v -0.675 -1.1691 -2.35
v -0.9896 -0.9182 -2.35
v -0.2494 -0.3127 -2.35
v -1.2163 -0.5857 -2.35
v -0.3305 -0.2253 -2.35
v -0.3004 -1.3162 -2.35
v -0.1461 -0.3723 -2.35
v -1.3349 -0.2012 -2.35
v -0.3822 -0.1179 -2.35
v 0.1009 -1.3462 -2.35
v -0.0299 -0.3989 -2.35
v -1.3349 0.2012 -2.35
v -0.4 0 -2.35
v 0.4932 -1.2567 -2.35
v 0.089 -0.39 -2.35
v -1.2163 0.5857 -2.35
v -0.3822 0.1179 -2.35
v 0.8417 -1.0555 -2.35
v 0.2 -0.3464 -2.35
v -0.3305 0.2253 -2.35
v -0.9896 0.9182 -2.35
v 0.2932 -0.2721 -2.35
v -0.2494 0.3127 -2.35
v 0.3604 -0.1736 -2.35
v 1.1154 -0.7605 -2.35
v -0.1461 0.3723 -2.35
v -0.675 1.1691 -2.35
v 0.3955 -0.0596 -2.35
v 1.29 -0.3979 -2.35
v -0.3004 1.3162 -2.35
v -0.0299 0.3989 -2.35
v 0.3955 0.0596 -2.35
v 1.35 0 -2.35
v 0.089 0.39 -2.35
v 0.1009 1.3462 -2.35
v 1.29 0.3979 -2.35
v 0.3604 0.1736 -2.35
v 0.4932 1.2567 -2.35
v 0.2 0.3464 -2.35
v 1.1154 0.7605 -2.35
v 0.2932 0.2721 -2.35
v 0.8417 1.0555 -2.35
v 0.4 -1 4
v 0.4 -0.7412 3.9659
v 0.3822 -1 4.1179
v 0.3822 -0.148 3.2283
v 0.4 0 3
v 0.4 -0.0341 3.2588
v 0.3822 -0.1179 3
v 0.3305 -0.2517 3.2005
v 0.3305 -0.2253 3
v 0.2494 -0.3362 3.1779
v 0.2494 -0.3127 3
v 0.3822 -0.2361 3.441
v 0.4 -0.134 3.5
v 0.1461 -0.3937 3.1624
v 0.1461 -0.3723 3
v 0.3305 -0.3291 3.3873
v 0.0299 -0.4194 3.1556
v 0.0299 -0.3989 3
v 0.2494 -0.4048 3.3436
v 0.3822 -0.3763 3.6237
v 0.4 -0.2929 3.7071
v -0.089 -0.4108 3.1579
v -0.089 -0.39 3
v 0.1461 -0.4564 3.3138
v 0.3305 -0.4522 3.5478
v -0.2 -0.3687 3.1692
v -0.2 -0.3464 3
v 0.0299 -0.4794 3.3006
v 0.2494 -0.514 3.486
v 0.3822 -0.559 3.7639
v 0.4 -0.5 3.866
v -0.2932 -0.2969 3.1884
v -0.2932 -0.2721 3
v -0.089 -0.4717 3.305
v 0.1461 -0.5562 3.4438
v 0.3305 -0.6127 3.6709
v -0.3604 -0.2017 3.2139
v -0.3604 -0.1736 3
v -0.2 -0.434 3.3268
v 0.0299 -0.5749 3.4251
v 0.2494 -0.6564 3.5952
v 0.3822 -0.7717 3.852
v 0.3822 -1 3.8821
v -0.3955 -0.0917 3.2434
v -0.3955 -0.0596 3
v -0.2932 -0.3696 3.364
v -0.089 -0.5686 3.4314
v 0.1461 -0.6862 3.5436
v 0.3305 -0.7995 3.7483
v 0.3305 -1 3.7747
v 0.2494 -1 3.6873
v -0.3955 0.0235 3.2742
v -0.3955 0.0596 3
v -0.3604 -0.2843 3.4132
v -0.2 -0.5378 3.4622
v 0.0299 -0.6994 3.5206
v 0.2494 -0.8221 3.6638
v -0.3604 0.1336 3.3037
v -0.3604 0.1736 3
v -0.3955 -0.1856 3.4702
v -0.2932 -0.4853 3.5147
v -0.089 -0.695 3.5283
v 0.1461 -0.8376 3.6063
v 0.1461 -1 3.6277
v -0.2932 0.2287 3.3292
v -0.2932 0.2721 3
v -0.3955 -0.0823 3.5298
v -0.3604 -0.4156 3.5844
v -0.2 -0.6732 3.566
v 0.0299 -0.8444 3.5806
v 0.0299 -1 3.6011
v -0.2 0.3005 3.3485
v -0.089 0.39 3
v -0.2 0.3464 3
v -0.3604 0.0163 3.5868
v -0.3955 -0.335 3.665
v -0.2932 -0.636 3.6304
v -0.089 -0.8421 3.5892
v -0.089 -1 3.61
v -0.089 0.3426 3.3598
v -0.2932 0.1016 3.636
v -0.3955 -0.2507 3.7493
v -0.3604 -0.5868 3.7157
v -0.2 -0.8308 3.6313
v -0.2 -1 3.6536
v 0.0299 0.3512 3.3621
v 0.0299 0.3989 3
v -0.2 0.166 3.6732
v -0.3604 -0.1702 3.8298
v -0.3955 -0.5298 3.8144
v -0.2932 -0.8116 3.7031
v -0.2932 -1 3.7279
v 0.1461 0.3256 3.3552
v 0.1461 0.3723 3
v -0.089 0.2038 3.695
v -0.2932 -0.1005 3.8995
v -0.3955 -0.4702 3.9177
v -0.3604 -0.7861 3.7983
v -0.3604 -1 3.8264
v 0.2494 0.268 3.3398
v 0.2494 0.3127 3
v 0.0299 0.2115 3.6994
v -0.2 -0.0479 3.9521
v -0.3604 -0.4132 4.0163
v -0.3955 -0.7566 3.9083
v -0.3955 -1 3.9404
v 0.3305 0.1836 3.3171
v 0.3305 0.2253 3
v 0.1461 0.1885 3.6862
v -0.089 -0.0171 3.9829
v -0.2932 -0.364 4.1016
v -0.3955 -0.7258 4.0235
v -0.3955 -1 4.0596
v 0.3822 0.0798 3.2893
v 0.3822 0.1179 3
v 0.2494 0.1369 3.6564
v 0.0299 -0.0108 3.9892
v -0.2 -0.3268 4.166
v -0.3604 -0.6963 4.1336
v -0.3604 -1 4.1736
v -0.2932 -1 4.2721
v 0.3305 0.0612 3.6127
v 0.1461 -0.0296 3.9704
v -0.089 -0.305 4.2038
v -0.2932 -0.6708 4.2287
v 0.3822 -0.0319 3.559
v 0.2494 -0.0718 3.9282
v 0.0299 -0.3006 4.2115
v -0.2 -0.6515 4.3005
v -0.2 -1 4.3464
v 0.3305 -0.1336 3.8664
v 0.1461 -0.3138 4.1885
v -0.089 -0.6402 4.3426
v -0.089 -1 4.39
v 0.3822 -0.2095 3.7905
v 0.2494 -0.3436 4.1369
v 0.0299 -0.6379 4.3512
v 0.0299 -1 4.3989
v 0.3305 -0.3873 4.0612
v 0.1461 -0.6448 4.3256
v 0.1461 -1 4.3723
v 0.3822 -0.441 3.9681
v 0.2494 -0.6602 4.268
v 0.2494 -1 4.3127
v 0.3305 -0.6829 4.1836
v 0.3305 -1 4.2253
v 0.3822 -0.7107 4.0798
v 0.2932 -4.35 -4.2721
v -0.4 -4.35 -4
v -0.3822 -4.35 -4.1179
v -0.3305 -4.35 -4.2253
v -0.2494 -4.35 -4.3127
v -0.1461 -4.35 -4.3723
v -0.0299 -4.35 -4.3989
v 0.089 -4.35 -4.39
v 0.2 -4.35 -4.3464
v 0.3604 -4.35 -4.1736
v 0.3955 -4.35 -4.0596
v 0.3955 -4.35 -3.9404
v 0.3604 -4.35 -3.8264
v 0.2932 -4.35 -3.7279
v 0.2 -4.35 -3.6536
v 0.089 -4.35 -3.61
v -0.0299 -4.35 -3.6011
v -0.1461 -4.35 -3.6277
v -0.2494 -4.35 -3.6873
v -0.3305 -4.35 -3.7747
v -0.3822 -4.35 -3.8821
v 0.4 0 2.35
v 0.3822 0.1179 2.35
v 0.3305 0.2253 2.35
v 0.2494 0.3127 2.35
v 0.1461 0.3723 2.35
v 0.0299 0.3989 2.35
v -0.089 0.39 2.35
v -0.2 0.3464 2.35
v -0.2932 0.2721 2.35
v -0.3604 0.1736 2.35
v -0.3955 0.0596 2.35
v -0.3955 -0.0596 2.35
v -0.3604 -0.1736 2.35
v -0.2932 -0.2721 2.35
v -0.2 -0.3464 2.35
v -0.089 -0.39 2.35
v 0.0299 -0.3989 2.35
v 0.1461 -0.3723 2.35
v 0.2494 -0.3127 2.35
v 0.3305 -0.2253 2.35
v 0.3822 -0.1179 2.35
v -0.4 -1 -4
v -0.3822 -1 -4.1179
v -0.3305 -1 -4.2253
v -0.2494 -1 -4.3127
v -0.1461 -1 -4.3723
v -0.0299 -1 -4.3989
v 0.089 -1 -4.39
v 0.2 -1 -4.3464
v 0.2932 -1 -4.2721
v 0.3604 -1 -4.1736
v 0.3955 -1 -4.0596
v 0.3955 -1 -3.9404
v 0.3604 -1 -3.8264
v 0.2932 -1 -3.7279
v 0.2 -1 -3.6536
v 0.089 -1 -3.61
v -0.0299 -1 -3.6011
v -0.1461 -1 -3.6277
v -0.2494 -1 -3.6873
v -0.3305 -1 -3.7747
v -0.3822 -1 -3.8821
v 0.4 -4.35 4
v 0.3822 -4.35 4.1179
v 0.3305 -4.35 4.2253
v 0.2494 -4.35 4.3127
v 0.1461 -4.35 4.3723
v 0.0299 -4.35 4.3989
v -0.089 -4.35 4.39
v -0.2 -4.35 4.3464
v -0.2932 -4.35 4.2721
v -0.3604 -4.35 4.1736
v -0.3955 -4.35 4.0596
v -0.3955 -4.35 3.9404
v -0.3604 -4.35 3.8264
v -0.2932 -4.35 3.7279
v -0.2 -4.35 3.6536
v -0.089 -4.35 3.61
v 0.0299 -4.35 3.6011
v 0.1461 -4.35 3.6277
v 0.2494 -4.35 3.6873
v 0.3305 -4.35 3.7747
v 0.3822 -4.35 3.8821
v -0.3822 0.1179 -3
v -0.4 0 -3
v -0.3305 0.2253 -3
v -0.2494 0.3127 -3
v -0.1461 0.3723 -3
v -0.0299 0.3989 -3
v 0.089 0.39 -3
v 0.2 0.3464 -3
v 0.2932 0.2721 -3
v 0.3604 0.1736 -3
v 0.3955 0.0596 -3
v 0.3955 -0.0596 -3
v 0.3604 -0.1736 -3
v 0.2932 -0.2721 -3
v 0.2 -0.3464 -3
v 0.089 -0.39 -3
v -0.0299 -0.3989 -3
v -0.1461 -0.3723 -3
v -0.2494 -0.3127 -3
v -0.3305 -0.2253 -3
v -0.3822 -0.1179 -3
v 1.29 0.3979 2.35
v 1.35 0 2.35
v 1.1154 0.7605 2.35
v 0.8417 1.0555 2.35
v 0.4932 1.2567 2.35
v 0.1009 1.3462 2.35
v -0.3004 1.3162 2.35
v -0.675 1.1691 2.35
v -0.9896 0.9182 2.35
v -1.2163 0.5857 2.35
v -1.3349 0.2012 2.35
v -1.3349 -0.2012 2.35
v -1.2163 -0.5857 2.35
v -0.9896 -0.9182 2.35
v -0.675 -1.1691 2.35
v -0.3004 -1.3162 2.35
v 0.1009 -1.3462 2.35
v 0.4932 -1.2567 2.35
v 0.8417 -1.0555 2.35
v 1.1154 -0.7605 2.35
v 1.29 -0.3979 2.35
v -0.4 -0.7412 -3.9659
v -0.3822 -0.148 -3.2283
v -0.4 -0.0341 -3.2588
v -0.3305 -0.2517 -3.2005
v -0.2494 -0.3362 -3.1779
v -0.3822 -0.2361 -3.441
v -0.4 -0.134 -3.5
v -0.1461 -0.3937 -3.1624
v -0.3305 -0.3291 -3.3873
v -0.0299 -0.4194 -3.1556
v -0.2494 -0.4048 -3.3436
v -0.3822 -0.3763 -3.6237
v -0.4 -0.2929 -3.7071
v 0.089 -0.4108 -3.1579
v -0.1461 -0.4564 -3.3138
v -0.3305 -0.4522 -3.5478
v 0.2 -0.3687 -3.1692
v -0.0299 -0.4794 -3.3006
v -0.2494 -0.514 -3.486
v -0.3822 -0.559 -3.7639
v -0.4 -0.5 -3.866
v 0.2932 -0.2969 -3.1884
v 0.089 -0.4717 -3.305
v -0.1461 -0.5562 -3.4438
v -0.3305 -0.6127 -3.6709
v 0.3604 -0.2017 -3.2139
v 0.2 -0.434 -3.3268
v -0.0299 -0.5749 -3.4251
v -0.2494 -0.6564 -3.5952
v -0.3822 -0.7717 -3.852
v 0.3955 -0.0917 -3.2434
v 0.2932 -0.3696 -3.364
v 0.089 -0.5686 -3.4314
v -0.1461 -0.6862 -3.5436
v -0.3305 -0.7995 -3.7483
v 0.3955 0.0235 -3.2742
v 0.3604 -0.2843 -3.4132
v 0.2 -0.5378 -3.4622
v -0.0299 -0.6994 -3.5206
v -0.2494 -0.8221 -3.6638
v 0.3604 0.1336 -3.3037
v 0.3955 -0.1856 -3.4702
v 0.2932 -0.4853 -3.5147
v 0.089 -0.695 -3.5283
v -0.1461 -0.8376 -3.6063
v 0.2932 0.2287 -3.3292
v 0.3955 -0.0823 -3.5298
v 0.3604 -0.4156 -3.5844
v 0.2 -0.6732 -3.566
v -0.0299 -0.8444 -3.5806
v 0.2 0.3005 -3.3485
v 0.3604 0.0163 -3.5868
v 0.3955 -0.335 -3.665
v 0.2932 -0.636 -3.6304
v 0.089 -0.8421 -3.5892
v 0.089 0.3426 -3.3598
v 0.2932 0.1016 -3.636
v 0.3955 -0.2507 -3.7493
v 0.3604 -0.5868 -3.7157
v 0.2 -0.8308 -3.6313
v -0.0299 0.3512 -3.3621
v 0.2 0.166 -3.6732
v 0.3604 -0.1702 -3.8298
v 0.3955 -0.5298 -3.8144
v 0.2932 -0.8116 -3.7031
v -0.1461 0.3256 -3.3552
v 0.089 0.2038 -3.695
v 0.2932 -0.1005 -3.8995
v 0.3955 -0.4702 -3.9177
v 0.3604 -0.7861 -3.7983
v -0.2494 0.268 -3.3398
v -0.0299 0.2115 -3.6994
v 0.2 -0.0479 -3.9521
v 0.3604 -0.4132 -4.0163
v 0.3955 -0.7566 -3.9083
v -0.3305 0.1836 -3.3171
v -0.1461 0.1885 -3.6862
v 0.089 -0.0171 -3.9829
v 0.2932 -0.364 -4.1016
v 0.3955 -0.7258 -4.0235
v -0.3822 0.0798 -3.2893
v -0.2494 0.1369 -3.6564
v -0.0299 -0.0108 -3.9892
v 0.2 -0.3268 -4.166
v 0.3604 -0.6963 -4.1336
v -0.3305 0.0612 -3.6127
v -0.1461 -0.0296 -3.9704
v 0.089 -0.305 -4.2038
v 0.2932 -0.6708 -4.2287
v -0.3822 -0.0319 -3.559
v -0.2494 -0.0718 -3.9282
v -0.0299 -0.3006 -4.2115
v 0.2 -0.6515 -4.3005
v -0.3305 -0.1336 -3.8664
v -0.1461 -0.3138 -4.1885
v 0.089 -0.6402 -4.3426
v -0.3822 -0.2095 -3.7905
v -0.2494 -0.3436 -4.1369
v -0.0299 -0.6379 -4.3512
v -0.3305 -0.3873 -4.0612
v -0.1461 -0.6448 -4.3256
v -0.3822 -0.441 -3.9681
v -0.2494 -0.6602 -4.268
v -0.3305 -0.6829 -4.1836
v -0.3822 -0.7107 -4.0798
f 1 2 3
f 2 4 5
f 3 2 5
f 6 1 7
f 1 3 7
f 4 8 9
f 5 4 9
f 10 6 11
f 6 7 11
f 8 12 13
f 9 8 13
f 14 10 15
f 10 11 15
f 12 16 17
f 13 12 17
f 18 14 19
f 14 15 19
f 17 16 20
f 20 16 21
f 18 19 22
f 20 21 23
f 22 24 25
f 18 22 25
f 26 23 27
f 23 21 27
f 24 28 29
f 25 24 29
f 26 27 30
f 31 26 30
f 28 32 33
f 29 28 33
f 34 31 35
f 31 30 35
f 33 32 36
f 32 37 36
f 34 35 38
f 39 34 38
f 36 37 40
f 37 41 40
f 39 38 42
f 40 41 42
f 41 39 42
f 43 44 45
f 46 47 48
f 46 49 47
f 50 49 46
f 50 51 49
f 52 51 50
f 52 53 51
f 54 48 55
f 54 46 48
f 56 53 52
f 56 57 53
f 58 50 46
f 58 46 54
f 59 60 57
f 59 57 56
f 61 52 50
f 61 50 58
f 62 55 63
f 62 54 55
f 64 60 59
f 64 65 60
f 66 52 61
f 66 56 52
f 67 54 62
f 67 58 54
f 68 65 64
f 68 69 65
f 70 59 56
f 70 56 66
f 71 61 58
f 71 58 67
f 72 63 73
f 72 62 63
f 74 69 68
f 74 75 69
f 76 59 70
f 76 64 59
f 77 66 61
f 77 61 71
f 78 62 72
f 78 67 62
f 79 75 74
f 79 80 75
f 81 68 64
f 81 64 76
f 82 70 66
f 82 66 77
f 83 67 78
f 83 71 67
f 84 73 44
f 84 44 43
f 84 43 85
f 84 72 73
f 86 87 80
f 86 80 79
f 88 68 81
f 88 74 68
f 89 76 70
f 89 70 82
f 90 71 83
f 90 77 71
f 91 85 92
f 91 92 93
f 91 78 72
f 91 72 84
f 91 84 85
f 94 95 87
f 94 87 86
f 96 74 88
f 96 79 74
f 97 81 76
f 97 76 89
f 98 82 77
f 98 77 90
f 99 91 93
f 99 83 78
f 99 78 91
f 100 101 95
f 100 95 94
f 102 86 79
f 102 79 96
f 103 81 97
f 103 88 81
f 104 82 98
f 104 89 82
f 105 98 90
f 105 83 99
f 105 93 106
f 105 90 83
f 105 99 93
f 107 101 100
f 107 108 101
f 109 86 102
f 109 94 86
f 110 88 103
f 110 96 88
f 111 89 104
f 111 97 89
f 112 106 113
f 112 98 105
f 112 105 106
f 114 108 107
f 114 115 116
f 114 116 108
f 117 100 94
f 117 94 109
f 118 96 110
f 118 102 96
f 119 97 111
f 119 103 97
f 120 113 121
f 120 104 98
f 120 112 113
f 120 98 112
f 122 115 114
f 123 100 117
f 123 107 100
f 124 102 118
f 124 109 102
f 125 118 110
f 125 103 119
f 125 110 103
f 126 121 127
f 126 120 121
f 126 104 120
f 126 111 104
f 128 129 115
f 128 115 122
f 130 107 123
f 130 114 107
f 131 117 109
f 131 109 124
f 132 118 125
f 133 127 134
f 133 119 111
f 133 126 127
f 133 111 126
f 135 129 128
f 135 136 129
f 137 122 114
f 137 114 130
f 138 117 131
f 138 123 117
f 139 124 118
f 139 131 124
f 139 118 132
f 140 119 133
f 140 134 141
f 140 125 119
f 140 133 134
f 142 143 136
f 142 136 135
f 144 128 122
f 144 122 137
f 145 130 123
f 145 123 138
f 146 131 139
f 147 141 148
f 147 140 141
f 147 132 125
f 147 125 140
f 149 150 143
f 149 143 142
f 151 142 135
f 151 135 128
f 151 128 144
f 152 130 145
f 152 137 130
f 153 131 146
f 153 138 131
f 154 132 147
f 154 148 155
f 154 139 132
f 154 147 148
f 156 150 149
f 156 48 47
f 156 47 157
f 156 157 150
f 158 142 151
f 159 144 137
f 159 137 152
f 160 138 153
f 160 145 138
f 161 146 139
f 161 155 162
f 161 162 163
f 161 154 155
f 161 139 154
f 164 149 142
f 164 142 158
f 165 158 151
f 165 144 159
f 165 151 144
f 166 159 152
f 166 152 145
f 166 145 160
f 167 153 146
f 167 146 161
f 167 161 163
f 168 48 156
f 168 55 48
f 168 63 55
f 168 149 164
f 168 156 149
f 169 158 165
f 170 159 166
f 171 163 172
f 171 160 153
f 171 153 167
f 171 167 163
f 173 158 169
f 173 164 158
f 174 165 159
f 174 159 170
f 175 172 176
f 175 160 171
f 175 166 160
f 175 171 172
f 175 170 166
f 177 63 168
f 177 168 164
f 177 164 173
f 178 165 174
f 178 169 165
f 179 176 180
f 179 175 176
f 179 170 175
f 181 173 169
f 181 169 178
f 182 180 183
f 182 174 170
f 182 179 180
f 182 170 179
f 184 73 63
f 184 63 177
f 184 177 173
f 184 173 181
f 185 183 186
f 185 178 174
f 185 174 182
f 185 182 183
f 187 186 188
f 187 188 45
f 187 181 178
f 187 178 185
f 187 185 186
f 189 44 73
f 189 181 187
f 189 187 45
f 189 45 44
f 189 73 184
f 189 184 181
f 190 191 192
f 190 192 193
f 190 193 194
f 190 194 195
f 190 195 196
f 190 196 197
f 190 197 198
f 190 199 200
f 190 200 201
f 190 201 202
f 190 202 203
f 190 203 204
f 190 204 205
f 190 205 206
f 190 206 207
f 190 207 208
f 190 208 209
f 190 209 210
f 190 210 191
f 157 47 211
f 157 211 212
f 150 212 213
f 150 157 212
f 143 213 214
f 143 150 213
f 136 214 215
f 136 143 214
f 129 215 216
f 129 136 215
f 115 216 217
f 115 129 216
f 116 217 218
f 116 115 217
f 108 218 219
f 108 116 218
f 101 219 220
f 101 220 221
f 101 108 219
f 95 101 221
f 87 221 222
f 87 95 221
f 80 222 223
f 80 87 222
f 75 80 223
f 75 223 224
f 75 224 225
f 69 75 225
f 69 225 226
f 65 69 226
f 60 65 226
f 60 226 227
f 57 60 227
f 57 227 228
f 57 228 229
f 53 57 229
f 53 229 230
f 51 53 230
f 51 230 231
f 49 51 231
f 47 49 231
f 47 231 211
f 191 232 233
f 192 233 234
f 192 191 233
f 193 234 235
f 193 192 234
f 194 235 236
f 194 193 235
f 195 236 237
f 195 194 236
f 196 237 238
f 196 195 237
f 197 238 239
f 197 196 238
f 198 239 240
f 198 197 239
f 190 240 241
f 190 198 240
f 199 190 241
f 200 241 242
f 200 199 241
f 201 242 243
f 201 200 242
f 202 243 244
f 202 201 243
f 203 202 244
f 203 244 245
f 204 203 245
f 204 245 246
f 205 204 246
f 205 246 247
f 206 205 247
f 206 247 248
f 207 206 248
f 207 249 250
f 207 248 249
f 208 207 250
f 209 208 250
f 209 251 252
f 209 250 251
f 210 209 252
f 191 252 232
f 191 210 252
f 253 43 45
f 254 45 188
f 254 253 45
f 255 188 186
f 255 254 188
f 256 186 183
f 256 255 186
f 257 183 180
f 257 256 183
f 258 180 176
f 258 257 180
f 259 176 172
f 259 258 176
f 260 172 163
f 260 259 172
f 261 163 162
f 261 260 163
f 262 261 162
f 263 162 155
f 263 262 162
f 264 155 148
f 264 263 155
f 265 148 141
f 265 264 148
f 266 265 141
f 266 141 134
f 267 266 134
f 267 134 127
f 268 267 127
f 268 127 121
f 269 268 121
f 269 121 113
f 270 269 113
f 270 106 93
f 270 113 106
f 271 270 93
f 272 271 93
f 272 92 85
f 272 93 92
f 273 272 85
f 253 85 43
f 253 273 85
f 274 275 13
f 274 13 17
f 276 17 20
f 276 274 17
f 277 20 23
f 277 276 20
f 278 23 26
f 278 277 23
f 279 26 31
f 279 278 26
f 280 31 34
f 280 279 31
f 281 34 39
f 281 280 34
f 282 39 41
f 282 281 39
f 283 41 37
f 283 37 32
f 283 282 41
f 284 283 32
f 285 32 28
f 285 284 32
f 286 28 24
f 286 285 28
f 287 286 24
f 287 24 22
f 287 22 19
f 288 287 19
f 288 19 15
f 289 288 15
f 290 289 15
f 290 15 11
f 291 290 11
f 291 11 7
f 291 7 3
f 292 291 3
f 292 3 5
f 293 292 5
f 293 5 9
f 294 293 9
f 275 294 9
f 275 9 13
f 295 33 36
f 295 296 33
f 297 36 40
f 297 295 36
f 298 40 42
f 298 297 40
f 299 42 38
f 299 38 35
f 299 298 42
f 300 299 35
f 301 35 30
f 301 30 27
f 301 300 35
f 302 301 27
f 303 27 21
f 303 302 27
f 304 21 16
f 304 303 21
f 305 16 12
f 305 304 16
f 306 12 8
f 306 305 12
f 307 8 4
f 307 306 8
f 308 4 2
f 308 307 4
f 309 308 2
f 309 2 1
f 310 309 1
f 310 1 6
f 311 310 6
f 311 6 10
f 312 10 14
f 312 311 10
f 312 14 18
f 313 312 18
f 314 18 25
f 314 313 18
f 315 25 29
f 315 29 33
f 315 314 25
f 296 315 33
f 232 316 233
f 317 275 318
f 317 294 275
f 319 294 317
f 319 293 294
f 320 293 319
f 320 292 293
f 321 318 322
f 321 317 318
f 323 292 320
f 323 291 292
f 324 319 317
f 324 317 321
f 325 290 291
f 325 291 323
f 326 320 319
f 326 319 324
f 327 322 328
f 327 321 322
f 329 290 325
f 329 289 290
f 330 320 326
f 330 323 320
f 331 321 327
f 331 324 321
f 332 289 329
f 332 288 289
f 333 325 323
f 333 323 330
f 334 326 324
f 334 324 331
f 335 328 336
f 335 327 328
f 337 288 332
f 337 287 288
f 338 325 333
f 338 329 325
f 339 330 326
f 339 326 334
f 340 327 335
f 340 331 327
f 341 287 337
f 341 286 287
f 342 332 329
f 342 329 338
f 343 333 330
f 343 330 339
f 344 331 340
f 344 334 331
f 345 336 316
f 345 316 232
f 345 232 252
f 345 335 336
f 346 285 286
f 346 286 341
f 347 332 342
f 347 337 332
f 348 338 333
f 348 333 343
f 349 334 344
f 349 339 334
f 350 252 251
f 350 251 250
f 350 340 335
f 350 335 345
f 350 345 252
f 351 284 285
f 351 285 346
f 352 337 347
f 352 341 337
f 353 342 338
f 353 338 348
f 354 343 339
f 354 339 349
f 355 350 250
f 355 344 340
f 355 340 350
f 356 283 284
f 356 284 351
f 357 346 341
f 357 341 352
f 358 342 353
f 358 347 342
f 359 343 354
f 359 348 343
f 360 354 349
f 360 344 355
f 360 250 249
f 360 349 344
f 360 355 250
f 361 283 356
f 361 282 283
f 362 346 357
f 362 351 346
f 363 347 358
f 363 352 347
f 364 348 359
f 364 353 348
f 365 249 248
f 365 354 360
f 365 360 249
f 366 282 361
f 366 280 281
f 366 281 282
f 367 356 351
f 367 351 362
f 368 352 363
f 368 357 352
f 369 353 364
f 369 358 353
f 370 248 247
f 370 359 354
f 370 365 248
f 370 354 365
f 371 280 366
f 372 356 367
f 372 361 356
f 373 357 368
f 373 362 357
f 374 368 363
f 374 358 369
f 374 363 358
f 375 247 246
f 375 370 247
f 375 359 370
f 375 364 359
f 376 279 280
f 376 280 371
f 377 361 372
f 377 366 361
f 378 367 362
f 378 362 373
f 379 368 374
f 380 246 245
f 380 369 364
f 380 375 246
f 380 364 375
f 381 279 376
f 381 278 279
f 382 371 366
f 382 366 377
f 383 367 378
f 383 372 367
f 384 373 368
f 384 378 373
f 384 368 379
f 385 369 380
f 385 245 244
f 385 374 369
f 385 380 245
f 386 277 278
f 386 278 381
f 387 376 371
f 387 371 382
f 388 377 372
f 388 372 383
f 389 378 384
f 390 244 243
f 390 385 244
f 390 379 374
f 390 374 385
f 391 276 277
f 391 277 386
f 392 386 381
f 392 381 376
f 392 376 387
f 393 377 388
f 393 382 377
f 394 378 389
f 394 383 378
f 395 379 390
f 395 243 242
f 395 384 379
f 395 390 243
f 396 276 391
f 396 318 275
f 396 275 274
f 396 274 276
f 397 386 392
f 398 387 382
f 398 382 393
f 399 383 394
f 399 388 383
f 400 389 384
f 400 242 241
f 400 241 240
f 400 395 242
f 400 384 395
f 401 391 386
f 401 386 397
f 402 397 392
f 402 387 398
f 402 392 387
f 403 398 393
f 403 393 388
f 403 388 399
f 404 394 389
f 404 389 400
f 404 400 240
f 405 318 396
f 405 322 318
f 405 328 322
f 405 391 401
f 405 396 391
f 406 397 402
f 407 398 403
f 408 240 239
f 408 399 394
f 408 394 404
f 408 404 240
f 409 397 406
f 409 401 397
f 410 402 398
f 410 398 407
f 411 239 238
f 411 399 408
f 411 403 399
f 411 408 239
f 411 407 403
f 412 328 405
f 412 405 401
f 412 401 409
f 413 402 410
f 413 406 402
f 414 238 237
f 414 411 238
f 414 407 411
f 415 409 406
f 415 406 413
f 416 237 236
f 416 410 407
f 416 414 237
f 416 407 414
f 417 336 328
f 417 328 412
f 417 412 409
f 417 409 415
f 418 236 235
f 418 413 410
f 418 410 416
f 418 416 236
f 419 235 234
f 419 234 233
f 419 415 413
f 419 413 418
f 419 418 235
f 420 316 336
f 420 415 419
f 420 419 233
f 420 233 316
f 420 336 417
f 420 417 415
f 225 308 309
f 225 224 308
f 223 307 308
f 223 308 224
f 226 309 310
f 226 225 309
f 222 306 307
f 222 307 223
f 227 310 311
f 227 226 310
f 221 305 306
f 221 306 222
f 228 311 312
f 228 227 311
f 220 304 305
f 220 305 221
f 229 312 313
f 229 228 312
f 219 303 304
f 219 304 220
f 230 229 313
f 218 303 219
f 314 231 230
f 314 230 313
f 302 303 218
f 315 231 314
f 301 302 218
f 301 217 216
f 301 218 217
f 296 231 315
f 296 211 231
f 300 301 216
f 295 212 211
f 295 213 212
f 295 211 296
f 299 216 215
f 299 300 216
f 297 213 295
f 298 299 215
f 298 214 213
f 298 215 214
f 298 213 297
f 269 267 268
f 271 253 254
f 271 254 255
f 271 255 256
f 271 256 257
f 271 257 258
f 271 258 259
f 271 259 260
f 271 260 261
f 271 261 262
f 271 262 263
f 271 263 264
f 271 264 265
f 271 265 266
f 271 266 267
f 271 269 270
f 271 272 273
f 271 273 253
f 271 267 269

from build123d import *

# Parameters (mm, degrees)
SKETCH_1_R      = 1.35
EXTRUDE_1_DEPTH = 2.35
SKETCH_3_R      = 0.4
SKETCH_2_R      = 0.4


with BuildPart() as part:
    # Эскиз1 → Бобышка-Вытянуть1 (new, symmetric)
    with BuildSketch(Plane.XY):
        Circle(SKETCH_1_R)
    extrude(amount=EXTRUDE_1_DEPTH, both=True)

    # По траектории1: sweep along a path in Эскиз5
    with BuildLine(Plane(origin=(0, 0, 0), x_dir=(0, 0, -1), z_dir=(1, 0, 0))) as sweep_1_path:
        Line((2.35, 0), (3, 0))
        ThreePointArc((3, 0), (3.707106781, -0.292893219), (4, -1))
        Line((4, -1), (4, -4.35))
    # Эскиз3 → По траектории1 (sweep)
    with BuildSketch(Plane(origin=(0, 0, -2.35), x_dir=(-1, 0, 0), z_dir=(0, 0, -1))):
        Circle(SKETCH_3_R)
    sweep(path=sweep_1_path.line)

    # По траектории2: sweep along a path in Эскиз6
    with BuildLine(Plane(origin=(0, 0, 0), x_dir=(0, 0, -1), z_dir=(1, 0, 0))) as sweep_2_path:
        Line((-2.35, 0), (-3, 0))
        ThreePointArc((-3, 0), (-3.707106781, -0.292893219), (-4, -1))
        Line((-4, -1), (-4, -4.35))
    # Эскиз2 → По траектории2 (sweep)
    with BuildSketch(Plane.XY.offset(2.35)):
        Circle(SKETCH_2_R)
    sweep(path=sweep_2_path.line)


solid = part.part
